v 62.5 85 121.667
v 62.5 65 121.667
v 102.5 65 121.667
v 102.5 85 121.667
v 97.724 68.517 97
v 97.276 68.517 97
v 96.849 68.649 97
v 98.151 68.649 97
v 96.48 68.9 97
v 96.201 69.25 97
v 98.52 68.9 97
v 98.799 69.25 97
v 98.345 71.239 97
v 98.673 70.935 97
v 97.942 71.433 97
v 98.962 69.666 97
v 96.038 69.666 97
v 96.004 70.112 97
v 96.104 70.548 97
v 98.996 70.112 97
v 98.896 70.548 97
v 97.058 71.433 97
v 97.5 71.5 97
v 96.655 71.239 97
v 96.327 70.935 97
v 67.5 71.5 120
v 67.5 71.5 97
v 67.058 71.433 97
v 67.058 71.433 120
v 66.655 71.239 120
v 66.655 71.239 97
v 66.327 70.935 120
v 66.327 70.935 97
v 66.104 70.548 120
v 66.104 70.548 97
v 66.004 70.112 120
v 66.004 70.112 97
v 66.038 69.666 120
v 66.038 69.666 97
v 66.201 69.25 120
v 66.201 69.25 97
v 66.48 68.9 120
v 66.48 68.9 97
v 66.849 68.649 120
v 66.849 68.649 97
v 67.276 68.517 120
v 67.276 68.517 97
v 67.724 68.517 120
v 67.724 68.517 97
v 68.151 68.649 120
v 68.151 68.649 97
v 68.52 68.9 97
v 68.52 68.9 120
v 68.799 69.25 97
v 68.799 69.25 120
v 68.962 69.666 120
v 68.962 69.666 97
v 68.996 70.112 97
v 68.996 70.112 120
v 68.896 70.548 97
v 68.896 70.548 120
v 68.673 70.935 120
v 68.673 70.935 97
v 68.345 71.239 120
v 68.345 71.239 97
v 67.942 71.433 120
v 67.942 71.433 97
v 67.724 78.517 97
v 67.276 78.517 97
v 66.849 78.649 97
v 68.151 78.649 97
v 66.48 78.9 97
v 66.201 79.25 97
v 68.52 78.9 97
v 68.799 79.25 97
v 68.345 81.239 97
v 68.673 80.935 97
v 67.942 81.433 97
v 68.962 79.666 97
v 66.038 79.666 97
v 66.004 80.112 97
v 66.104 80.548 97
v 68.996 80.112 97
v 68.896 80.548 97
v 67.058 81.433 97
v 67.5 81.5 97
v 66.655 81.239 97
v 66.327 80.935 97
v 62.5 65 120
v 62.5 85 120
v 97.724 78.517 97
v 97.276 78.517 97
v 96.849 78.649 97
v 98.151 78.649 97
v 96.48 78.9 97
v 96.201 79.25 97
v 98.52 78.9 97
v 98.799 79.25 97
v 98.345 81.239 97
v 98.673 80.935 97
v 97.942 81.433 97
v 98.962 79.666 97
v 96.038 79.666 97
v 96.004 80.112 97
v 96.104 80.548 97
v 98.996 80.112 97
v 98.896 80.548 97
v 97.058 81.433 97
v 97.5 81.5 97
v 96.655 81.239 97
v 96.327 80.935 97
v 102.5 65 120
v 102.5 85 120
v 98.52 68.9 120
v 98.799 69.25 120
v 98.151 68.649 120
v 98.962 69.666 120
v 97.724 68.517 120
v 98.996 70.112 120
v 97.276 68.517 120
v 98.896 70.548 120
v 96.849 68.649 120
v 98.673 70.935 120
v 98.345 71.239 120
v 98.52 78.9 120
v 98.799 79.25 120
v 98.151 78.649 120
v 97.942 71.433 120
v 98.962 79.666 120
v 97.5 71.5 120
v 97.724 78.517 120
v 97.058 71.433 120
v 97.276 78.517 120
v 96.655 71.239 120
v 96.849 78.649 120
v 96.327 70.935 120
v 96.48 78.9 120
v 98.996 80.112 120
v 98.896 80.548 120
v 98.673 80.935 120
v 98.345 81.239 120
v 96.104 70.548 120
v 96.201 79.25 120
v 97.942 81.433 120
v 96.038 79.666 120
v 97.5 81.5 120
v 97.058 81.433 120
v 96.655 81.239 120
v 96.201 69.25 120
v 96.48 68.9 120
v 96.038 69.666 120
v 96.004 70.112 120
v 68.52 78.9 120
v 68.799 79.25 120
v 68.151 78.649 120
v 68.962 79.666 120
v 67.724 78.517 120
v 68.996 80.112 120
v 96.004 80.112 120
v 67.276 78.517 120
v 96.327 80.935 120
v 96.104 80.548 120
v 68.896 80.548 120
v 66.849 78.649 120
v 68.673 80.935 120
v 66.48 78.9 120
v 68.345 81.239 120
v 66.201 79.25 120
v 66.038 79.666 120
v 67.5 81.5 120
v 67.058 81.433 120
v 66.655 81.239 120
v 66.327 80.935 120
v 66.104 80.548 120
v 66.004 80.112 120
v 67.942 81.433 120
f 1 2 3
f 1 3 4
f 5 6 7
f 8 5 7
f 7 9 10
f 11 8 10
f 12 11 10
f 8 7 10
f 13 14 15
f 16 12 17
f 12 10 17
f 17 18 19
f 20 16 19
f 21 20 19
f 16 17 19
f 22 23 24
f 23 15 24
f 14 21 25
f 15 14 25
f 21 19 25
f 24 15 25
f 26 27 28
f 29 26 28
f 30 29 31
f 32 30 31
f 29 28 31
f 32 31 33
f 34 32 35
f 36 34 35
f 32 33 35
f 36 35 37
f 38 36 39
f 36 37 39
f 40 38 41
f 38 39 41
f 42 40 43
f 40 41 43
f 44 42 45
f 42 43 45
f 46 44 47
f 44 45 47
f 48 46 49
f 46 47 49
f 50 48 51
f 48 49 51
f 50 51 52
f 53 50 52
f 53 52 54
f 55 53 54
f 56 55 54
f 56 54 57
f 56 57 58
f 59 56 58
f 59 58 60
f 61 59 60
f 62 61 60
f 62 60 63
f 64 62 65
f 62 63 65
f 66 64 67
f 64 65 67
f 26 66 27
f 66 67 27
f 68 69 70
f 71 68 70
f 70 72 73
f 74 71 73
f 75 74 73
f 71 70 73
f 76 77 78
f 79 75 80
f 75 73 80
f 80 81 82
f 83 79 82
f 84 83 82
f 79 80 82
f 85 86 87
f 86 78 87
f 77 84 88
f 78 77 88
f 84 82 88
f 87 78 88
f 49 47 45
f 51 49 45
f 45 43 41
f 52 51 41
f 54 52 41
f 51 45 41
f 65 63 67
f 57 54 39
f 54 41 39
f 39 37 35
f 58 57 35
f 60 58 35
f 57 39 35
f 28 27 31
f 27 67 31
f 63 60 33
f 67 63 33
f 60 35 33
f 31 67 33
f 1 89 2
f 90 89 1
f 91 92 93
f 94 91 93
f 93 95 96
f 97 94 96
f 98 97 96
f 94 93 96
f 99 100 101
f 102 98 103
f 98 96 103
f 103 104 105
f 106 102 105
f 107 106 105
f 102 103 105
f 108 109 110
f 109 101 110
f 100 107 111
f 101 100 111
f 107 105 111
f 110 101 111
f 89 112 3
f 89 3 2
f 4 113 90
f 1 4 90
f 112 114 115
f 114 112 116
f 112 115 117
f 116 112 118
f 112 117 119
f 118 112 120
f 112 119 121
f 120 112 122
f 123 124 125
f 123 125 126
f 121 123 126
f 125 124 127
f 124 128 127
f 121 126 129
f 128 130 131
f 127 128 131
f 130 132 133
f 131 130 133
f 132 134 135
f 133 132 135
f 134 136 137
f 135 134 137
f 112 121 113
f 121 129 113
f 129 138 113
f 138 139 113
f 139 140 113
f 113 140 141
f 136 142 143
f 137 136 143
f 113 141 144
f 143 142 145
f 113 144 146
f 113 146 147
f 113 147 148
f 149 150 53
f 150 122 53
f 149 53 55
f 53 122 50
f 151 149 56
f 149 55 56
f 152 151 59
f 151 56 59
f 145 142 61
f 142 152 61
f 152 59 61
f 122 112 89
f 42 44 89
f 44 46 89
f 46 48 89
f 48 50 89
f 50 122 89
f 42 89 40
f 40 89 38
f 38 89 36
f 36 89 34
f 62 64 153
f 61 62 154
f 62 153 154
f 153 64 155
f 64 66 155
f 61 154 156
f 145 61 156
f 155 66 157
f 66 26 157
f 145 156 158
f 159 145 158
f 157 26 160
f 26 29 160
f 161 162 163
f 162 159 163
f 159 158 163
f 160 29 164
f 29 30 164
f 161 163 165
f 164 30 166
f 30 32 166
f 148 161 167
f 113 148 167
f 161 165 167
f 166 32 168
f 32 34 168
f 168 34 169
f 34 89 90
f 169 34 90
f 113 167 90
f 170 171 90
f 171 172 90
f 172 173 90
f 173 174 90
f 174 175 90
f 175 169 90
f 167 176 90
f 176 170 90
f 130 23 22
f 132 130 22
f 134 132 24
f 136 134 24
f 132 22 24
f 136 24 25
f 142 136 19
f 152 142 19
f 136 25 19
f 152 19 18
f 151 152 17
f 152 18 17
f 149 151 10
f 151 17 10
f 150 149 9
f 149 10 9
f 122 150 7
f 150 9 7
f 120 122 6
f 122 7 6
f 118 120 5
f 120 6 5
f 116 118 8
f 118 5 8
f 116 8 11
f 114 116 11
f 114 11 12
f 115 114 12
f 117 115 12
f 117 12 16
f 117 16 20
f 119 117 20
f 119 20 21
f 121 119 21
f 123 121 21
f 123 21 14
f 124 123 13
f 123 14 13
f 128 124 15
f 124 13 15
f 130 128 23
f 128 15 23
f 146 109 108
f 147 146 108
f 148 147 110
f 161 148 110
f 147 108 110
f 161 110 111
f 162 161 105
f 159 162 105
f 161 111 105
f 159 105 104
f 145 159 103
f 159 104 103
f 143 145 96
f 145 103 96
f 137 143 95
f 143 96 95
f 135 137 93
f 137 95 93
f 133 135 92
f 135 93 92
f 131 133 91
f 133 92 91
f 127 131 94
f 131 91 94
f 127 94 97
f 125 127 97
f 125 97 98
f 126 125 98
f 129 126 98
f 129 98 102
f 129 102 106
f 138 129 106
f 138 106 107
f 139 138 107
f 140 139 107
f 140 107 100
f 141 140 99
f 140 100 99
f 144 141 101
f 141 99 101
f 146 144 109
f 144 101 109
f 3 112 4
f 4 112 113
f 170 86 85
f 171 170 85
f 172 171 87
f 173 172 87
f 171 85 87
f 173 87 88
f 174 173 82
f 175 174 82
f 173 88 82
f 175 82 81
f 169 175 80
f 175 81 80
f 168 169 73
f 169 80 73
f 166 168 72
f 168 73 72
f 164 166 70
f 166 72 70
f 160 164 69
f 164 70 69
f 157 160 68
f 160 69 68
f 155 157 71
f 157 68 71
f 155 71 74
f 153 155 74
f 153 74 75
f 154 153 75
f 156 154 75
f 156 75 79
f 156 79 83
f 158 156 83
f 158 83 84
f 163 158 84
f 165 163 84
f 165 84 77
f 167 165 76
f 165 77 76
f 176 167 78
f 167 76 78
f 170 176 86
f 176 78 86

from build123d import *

# Parameters (mm, degrees)
CYLINDER001_R             = 1.5
CYLINDER001_DEPTH         = 23
ARRAY002_X_COUNT          = 2
ARRAY002_X_PITCH          = 10
ARRAY002_Y_COUNT          = 2
ARRAY002_Y_PITCH          = 30
BOX015_W                  = 20
BOX015_H                  = 40
BOX015_DEPTH              = 1.66667
FUSION004_PLACEMENT_ANGLE = 90


with BuildPart() as matriz_4_patas_mesa_escritorio:
    # Cylinder001 → Cylinder001 (new body)
    with BuildSketch(Plane(origin=(70, 112.5, 0), x_dir=(1, 0, 0), z_dir=(0, 0, 1))):
        Circle(CYLINDER001_R)
    extrude(amount=CYLINDER001_DEPTH)

    # Array002 X: Matriz 4 patas mesa escritorio ×2


with BuildPart() as matriz_4_patas_mesa_escritorio_1:
    add(matriz_4_patas_mesa_escritorio.part)
    with Locations(*[(i * ARRAY002_X_PITCH, 0, 0) for i in range(1, ARRAY002_X_COUNT)]):
        add(matriz_4_patas_mesa_escritorio.part)

    # Array002 Y: Matriz 4 patas mesa escritorio ×2


with BuildPart() as matriz_4_patas_mesa_escritorio_2:
    add(matriz_4_patas_mesa_escritorio_1.part)
    with Locations(*[(0, i * ARRAY002_Y_PITCH, 0) for i in range(1, ARRAY002_Y_COUNT)]):
        add(matriz_4_patas_mesa_escritorio_1.part)


with BuildPart() as mesa_escritorio:
    # Box015 → Box015 (new body)
    with BuildSketch(Plane(origin=(65, 107.5, 23), x_dir=(1, 0, 0), z_dir=(0, 0, 1))):
        with Locations((10, 20)):
            Rectangle(BOX015_W, BOX015_H)
    extrude(amount=BOX015_DEPTH)

    # Fusion004: union Matriz 4 patas mesa escritorio
    add(matriz_4_patas_mesa_escritorio_2.part)


with BuildPart() as mesa_escritorio_1:
    # Fusion004 placement: moved
    add(mesa_escritorio.part.moved(Location((210, 0, 97))).rotate(Axis((210, 0, 97), (0, 0, 1)), FUSION004_PLACEMENT_ANGLE))


solid = mesa_escritorio_1.part
